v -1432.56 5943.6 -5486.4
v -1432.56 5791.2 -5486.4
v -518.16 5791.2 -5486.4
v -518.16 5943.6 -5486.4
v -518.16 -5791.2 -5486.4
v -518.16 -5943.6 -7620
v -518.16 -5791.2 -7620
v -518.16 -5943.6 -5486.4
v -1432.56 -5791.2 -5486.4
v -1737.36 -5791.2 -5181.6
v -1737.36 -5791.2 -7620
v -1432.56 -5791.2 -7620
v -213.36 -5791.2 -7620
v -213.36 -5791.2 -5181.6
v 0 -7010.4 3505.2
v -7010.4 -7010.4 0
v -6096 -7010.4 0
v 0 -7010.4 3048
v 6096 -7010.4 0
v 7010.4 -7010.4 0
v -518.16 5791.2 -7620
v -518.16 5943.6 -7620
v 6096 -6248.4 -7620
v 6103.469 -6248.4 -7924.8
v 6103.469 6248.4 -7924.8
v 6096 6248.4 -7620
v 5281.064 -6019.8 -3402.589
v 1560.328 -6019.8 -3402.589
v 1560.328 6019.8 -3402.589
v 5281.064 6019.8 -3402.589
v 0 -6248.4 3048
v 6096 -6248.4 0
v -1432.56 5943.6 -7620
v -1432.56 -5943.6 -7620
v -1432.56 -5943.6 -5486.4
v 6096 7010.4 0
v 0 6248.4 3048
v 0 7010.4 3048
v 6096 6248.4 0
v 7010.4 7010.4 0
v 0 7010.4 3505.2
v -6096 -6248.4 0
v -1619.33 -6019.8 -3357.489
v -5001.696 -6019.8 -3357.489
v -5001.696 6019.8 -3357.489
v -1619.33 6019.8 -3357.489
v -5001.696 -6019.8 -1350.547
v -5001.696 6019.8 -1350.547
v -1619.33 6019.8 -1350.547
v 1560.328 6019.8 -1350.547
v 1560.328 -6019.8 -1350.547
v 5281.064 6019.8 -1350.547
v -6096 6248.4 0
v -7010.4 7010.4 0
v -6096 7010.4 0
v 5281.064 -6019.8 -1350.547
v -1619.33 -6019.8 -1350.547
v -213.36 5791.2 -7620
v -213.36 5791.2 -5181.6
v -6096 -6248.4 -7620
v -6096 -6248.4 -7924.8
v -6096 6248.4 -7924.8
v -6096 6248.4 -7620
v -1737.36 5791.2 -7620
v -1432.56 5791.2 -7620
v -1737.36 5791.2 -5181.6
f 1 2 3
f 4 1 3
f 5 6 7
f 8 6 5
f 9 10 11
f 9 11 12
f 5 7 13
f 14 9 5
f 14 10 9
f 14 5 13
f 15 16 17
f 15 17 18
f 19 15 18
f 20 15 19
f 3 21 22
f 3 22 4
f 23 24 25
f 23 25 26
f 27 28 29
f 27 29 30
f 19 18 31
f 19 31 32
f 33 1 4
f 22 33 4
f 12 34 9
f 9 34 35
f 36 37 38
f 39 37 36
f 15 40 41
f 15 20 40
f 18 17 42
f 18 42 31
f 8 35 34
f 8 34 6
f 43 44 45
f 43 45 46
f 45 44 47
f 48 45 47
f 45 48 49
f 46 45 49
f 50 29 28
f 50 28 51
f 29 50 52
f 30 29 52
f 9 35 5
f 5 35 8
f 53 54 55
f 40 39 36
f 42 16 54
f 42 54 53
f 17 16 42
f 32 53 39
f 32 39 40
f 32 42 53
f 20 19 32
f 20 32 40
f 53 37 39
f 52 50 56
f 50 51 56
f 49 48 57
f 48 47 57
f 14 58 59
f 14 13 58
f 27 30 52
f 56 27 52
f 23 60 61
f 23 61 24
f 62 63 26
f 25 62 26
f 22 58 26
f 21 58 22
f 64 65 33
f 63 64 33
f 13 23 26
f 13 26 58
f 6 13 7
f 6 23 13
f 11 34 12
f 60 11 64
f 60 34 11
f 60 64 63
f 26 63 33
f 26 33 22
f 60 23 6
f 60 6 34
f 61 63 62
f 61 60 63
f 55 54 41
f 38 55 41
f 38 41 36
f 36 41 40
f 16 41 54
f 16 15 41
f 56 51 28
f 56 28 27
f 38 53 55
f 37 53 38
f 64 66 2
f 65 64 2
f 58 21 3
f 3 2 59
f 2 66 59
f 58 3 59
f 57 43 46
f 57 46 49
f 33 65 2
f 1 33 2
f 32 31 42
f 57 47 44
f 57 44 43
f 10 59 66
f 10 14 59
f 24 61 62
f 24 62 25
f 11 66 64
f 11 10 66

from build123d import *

# Parameters (mm, degrees)
F1_DEPTH = 7010.4
F0_W     = 1828.8
F0_H     = 1524
F2_DEPTH = 6248.4
F3_DEPTH = 6248.4
F4_DEPTH = 6248.4
F0_W_2   = 3382.3656
F0_H_2   = 2006.9420337677
F6_DEPTH = 6019.8
F0_W_3   = 3720.7353115082
F0_H_3   = 2052.0417690277
F7_DEPTH = 6019.8
F0_W_4   = 914.4
F0_H_4   = 2133.6
F8_DEPTH = 5943.6
F9_DEPTH = 5791.2


# Not quite as in the source:
# - the program builds the solid bodies; features that only make, move or delete a surface that nothing else refers to are left out


with BuildPart() as f1:
    # F0 (on Front) → F1 (new body, symmetric)
    with BuildSketch(Plane.XZ):
        Polygon((-7010.4, 0), (-6096, 0), (0, 3048), (0, 3505.2), align=None)
        Polygon((0, 3048), (6096, 0), (7010.4, 0), (0, 3505.2), align=None)
    extrude(amount=F1_DEPTH, both=True)

    # F0 (on Front) → F2 (join, symmetric)
    with BuildSketch(Plane.XZ):
        Polygon((-6096, 0), (0, 0), (6096, 0), (0, 3048), align=None)
        with Locations((-26.6336387634, 1481.3042635918)):
            Rectangle(F0_W, F0_H, mode=Mode.SUBTRACT)
    extrude(amount=F2_DEPTH, both=True)

    # F0 (on Front) → F3 (join, symmetric)
    with BuildSketch(Plane.XZ):
        with Locations((-26.6336387634, 1481.3042635918)):
            Rectangle(F0_W, F0_H)
    extrude(amount=F3_DEPTH, both=True)


with BuildPart() as f4:
    # F0 (on Front) → F4 (new body, symmetric)
    with BuildSketch(Plane.XZ):
        Polygon((-1737.3600006104, -7620), (-6096, -7620), (-6096, -7924.8), (6103.4693717957, -7924.8), (6096, -7620), (-213.3600006104, -7620), (-518.1600006104, -7620), (-1432.5600006104, -7620), align=None)
    extrude(amount=F4_DEPTH, both=True)

    # F0 (on Front) → F8 (join, symmetric)
    with BuildSketch(Plane.XZ):
        with Locations((-975.3600006104, -6553.2)):
            Rectangle(F0_W_4, F0_H_4)
    extrude(amount=F8_DEPTH, both=True)

    # F0 (on Front) → F9 (join, symmetric)
    with BuildSketch(Plane.XZ):
        Polygon((-1737.3600006104, -5181.6), (-1737.3600006104, -7620), (-1432.5600006104, -7620), (-1432.5600006104, -5486.4), (-518.1600006104, -5486.4), (-518.1600006104, -7620), (-213.3600006104, -7620), (-213.3600006104, -5181.6), align=None)
    extrude(amount=F9_DEPTH, both=True)


with BuildPart() as f6:
    # F0 (on Front) → F6 (new body, symmetric)
    with BuildSketch(Plane.XZ):
        with Locations((-3310.5129081657, -2354.0180921555)):
            Rectangle(F0_W_2, F0_H_2)
    extrude(amount=F6_DEPTH, both=True)


with BuildPart() as f7:
    # F0 (on Front) → F7 (new body, symmetric)
    with BuildSketch(Plane.XZ):
        with Locations((3420.6959448952, -2376.5679597855)):
            Rectangle(F0_W_3, F0_H_3)
    extrude(amount=F7_DEPTH, both=True)


solid = Compound([f1.part, f4.part, f6.part, f7.part])
